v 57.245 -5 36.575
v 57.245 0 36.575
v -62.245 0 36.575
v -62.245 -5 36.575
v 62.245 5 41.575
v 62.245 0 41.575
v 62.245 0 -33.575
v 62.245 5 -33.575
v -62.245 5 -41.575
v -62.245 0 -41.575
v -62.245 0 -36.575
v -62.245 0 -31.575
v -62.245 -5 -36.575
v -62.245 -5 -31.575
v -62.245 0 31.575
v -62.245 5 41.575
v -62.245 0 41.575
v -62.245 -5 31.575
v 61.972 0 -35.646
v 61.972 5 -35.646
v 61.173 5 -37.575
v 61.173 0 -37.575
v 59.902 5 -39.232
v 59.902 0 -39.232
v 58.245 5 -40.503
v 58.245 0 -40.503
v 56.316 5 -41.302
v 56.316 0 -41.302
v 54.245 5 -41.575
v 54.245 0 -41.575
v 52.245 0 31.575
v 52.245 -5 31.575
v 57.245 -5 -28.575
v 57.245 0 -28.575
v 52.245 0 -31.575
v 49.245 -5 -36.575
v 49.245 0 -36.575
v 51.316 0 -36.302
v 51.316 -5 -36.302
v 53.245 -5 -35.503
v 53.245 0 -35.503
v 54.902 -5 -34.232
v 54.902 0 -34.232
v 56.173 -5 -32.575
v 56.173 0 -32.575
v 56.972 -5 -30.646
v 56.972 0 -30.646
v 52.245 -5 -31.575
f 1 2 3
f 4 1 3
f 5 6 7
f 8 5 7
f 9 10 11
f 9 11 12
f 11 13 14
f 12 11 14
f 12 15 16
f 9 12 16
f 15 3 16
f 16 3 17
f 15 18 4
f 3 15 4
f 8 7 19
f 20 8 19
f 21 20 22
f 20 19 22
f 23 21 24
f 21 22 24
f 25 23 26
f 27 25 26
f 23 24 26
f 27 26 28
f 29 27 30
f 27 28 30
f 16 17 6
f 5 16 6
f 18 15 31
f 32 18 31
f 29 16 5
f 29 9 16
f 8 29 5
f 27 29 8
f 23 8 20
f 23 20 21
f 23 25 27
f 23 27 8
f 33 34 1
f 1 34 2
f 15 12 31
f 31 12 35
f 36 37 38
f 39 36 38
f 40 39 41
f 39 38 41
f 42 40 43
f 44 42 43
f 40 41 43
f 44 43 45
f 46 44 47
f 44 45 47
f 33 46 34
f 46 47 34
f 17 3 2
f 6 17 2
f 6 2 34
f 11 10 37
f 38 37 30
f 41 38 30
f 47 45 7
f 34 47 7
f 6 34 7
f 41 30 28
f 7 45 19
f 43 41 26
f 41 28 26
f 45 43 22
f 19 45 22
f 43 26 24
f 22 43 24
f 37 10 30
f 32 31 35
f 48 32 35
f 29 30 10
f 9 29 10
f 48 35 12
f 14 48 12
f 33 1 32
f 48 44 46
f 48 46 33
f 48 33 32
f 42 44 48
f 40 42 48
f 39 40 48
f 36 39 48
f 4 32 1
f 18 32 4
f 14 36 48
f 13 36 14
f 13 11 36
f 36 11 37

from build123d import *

# Parameters (mm, degrees)
SALIENTE_EXTRUIR1_DEPTH = 5
SALIENTE_EXTRUIR2_DEPTH = 5


with BuildPart() as part:
    # Croquis1 → Saliente-Extruir1 (new body)
    with BuildSketch(Plane(origin=(0, 0, 0), x_dir=(1, 0, 0), z_dir=(0, 1, 0))):
        with BuildLine():
            Line((-62.245, -41.575), (62.245, -41.575))
            Line((62.245, -41.575), (62.245, 33.575))
            ThreePointArc((62.245, 33.575), (59.901854249, 39.231854249), (54.245, 41.575))
            Line((54.245, 41.575), (-62.245, 41.575))
            Line((-62.245, 41.575), (-62.245, -41.575))
        make_face()
    extrude(amount=SALIENTE_EXTRUIR1_DEPTH)

    # Croquis2 → Saliente-Extruir2 (add)
    with BuildSketch(Plane(origin=(0, 0, 0), x_dir=(1, 0, 0), z_dir=(0, 1, 0))):
        with BuildLine():
            Line((52.245, -31.575), (52.245, 31.575))
            Line((52.245, 31.575), (21.4, 31.575))
            Line((21.4, 31.575), (-62.245, 31.575))
            Line((-62.245, 31.575), (-62.245, 36.575))
            Line((-62.245, 36.575), (49.245, 36.575))
            ThreePointArc((49.245, 36.575), (54.901854249, 34.231854249), (57.245, 28.575))
            Line((57.245, 28.575), (57.245, -36.575))
            Line((57.245, -36.575), (-62.245, -36.575))
            Line((-62.245, -36.575), (-62.245, -31.575))
            Line((-62.245, -31.575), (52.245, -31.575))
        make_face()
    extrude(amount=-SALIENTE_EXTRUIR2_DEPTH)


solid = part.part
